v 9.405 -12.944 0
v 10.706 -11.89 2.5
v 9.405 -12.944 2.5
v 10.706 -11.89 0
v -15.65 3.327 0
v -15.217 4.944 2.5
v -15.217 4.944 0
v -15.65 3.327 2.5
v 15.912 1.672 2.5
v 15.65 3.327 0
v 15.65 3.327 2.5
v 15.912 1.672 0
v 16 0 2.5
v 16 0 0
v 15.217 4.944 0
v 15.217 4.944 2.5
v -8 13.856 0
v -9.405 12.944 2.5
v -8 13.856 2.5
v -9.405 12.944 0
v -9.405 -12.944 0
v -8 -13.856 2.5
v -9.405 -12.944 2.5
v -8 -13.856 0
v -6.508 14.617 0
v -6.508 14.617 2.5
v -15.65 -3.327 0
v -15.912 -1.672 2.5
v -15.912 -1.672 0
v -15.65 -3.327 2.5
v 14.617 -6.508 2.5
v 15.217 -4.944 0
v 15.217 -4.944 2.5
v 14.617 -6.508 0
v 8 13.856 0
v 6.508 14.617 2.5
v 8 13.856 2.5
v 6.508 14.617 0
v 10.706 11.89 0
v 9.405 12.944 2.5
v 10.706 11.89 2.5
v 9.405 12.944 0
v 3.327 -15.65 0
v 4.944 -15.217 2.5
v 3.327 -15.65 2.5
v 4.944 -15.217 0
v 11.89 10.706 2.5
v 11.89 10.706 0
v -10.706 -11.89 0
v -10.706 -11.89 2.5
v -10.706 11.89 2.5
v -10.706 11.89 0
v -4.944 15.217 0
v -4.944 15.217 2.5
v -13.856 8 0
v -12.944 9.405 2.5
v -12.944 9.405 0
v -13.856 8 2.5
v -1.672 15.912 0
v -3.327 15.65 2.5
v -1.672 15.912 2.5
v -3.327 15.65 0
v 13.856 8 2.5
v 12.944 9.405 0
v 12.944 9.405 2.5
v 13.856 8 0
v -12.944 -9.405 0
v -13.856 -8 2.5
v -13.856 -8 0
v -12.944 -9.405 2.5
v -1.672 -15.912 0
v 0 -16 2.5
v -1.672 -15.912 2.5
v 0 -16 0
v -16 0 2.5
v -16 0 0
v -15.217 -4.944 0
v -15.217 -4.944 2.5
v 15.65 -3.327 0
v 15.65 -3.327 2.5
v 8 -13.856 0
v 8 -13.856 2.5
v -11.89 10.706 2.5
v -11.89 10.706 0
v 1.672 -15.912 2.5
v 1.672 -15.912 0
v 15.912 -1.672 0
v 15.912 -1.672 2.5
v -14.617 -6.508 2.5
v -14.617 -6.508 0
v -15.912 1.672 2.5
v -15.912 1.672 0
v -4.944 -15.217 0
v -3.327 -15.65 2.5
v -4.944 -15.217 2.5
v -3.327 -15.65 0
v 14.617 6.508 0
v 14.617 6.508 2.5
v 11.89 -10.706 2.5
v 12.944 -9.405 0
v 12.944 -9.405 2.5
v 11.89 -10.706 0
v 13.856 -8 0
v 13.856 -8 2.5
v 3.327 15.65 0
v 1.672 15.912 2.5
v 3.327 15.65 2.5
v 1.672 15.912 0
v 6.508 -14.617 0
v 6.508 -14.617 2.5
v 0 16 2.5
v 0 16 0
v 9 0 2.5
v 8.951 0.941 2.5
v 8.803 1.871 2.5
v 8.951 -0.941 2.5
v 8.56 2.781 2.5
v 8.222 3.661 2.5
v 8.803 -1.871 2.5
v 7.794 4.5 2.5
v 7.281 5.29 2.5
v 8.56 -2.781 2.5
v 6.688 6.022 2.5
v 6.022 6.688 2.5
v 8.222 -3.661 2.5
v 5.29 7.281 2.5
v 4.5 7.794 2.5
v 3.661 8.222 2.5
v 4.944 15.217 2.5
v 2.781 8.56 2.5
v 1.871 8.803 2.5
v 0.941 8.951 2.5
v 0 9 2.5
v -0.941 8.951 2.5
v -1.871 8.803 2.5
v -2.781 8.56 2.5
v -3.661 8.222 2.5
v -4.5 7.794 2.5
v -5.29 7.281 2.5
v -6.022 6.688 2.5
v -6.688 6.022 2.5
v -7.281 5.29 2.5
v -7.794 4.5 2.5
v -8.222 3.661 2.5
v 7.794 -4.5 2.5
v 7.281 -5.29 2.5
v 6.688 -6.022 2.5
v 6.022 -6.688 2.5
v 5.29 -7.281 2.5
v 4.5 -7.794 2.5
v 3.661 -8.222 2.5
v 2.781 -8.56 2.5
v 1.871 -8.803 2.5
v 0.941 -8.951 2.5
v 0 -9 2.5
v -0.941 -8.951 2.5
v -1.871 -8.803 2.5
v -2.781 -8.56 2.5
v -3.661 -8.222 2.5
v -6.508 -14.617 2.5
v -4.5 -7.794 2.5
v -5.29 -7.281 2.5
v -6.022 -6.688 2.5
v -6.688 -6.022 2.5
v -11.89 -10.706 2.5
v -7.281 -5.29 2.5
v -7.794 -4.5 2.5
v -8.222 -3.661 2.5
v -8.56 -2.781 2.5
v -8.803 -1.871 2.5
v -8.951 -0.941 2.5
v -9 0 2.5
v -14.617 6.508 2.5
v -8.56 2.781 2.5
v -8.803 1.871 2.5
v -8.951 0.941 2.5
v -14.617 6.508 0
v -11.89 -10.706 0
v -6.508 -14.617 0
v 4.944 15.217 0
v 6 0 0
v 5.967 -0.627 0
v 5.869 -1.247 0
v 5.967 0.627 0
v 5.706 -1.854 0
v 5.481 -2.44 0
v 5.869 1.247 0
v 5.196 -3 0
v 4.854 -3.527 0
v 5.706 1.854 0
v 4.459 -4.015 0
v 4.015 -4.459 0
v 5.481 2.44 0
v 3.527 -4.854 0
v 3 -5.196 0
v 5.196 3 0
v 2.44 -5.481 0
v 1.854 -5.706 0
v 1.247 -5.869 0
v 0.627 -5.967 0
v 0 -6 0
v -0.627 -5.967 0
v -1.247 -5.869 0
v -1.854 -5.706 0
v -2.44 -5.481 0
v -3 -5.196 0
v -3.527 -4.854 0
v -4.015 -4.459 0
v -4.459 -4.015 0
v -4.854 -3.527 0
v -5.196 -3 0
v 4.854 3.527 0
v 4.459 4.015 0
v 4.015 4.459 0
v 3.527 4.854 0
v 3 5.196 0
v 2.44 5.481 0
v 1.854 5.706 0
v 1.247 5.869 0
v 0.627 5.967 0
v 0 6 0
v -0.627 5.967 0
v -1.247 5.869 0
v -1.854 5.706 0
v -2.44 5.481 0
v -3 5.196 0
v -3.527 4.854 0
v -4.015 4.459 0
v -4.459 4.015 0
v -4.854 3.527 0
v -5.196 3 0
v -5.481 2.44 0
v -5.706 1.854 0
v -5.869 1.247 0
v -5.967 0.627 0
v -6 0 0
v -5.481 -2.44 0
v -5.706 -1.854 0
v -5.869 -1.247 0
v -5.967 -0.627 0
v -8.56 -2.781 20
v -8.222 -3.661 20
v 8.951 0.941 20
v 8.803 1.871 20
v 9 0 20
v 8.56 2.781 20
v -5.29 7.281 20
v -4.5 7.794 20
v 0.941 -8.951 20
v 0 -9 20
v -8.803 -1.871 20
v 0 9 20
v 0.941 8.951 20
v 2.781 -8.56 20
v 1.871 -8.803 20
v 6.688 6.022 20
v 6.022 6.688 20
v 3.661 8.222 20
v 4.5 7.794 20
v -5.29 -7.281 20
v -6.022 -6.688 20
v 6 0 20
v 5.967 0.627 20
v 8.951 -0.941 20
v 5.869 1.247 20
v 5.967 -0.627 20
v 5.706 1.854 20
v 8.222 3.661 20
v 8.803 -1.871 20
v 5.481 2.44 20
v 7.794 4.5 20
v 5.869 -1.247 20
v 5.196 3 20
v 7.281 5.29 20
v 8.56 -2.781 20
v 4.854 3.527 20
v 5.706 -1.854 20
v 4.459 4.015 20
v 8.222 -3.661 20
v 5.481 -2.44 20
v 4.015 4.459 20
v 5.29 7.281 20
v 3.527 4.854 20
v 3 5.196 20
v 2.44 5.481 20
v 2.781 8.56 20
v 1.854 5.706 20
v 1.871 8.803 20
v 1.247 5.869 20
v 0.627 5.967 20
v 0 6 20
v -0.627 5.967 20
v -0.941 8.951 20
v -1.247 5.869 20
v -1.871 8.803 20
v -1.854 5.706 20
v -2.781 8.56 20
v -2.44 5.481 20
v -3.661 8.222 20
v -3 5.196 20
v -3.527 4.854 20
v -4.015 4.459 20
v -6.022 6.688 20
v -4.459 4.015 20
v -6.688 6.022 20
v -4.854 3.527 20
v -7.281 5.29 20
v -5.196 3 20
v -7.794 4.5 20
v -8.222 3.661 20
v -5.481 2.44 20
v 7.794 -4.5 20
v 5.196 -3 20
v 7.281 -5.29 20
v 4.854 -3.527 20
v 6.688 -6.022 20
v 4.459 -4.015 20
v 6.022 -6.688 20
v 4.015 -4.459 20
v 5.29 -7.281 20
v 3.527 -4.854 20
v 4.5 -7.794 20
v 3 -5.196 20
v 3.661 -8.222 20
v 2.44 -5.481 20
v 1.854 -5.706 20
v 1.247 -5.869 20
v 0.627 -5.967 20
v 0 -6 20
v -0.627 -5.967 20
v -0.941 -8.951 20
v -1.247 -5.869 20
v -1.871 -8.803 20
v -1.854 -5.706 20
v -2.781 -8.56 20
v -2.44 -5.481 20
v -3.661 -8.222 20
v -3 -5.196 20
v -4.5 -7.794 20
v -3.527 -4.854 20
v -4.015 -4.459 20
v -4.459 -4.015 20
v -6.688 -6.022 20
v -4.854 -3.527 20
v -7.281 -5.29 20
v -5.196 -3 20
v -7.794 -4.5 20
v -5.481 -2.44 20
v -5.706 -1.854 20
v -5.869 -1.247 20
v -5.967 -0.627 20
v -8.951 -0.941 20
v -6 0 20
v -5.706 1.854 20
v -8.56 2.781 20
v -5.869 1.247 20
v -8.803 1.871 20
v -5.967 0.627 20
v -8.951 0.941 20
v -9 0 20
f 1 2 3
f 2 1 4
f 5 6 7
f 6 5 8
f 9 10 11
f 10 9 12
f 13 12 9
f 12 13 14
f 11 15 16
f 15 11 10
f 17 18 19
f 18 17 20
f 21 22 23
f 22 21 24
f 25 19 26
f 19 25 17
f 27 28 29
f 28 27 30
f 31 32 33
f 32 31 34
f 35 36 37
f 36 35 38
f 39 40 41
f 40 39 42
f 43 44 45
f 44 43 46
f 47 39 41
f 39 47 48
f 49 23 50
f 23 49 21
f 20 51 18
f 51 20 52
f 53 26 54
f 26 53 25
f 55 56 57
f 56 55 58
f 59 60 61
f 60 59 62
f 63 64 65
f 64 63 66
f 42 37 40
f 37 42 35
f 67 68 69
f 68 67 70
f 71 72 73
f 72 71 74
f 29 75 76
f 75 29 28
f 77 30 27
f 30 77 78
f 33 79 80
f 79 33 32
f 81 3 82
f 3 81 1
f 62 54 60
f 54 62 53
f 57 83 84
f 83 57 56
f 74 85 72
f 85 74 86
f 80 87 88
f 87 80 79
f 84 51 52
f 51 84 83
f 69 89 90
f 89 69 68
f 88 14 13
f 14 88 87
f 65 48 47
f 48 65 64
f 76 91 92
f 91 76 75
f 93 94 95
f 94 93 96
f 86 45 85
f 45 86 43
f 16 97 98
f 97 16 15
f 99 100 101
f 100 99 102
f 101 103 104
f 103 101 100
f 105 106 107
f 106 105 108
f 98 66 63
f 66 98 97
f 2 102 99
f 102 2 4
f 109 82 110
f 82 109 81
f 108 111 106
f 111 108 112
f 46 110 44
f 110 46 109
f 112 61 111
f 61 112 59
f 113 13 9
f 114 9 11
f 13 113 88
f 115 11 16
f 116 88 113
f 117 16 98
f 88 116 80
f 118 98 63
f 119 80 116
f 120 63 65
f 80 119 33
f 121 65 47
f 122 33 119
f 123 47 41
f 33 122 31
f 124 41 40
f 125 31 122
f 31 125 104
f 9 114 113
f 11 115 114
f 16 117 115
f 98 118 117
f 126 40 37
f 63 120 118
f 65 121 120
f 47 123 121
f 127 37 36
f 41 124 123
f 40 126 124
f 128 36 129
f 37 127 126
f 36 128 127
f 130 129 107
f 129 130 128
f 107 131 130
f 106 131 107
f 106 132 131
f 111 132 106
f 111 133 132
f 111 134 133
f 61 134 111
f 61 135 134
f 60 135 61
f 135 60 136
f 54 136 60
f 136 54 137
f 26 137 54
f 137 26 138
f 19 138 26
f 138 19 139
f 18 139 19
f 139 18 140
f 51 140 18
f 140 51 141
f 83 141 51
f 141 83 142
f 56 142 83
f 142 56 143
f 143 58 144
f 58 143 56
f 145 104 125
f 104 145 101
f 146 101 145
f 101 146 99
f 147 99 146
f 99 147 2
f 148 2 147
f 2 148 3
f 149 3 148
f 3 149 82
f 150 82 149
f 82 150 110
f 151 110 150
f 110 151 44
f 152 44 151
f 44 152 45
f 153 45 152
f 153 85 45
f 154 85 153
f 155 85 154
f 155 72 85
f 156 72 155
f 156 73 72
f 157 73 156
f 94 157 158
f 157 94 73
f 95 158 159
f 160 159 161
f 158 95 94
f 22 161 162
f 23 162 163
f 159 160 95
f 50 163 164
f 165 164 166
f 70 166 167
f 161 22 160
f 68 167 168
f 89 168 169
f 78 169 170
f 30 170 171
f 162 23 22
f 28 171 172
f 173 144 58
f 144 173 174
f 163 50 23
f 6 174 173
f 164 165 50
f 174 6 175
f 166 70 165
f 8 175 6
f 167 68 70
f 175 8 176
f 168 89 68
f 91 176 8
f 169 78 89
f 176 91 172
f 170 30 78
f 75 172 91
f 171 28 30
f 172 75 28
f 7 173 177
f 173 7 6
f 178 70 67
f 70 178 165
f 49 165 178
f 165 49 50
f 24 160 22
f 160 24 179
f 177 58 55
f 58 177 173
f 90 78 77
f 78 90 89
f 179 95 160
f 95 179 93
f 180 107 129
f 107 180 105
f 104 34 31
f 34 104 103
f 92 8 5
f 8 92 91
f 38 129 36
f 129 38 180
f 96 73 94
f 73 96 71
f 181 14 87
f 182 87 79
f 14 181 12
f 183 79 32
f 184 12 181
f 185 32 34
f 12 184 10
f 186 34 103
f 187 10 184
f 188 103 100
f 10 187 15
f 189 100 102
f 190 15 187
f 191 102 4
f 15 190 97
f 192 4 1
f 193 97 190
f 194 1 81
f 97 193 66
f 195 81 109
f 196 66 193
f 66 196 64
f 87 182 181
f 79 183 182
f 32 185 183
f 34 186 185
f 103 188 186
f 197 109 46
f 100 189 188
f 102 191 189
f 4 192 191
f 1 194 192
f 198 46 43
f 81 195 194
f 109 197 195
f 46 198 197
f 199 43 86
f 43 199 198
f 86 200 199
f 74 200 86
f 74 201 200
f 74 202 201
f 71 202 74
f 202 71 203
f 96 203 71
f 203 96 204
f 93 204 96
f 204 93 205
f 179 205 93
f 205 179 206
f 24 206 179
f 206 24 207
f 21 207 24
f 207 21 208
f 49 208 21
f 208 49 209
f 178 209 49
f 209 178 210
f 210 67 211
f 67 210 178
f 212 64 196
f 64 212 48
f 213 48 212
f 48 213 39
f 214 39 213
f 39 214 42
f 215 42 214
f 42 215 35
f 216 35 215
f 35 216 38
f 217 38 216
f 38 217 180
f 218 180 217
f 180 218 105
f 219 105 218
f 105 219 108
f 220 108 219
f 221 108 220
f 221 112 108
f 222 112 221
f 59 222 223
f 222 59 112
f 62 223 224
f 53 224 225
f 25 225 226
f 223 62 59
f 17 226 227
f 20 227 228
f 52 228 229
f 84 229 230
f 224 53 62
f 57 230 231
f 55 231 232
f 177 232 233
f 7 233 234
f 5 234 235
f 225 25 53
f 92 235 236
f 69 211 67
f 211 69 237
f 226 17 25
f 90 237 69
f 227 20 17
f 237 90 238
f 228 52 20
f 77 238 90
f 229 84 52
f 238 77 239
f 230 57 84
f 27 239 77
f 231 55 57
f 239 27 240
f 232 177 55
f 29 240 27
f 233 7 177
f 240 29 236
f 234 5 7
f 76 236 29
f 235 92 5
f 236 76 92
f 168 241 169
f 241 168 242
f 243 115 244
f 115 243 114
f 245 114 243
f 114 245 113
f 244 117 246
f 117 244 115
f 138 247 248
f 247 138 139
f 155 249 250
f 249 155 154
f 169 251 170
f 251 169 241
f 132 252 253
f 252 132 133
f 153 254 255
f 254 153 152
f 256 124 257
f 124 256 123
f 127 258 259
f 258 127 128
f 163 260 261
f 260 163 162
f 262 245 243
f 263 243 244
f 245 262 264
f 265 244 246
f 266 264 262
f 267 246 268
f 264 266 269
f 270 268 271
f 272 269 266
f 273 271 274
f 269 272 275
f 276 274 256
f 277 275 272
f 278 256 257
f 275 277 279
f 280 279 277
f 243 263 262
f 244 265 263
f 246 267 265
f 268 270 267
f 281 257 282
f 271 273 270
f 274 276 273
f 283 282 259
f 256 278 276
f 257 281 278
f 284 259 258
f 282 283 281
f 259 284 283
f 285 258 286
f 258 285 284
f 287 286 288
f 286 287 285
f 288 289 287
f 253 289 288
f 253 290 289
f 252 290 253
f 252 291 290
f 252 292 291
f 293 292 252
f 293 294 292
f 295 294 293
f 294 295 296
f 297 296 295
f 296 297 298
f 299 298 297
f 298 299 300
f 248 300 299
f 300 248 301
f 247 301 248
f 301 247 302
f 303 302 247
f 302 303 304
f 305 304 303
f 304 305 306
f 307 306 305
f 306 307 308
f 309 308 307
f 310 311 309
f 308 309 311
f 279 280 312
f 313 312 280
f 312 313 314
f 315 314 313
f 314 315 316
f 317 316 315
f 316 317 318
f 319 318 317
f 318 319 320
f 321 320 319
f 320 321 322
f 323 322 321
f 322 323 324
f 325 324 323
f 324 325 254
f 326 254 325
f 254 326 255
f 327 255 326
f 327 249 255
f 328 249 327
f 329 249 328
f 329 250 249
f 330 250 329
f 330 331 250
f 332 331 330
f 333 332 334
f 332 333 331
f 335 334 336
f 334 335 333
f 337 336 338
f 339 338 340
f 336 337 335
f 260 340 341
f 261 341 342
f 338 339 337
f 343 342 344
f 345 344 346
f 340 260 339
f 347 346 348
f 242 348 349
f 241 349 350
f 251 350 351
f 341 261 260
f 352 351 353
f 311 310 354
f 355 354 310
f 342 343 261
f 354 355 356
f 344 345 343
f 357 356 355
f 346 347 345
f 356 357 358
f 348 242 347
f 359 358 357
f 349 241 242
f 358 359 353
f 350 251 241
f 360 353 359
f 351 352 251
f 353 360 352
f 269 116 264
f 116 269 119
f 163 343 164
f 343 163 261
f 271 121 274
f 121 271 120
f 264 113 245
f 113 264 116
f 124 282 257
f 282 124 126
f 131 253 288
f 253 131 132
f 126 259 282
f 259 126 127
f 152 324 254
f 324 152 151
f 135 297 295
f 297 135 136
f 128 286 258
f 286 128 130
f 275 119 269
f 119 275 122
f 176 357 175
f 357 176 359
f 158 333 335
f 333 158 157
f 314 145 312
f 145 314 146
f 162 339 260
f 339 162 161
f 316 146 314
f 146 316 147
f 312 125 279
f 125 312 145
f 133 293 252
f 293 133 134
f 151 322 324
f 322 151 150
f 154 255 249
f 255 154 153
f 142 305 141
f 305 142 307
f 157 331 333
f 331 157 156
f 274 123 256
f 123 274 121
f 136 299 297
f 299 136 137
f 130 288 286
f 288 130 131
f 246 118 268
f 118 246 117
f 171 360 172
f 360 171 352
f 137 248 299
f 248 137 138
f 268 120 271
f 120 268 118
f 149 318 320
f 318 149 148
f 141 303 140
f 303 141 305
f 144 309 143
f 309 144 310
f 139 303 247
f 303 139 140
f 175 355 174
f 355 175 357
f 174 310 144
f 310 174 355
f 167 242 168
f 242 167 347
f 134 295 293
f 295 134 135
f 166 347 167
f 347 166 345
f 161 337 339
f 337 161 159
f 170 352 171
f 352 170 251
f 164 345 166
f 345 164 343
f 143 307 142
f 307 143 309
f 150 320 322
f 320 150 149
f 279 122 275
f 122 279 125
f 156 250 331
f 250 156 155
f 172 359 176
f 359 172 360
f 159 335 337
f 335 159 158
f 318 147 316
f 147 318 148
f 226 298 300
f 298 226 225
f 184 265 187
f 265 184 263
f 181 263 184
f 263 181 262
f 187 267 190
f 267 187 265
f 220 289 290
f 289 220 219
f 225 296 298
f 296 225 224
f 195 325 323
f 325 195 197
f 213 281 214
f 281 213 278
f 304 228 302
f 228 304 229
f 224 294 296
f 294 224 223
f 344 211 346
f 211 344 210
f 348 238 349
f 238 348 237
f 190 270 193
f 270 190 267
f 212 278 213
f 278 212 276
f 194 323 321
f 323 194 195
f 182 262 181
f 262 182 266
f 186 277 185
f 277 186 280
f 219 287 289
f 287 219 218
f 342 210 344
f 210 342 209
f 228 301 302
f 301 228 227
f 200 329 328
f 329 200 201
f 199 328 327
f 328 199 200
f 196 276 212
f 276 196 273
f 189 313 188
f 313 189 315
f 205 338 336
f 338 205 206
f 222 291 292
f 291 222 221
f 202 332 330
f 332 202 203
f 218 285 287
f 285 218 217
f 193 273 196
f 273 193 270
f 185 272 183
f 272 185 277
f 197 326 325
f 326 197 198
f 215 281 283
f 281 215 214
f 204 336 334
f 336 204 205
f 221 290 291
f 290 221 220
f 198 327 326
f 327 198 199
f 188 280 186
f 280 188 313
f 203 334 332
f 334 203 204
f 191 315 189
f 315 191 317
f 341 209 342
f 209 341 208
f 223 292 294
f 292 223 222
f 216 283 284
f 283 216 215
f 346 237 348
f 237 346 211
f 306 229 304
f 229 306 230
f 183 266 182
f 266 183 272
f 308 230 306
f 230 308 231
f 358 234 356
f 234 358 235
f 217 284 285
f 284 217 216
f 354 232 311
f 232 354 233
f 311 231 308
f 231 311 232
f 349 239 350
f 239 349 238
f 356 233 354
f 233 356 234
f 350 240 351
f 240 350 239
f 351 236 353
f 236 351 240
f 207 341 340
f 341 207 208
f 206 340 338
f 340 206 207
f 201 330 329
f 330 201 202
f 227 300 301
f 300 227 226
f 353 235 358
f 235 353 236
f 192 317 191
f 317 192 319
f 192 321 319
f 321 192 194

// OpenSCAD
// Flanged sleeve bushing.
$fn = 60;
eps = 0.02;
inner_d = 12;
outer_d = 18;
length = 20;
flange_d = 32;
flange_t = 2.5;
difference() {
    union() {
        cylinder(d = flange_d, h = flange_t);
        cylinder(d = outer_d, h = length);
    }
    translate([0, 0, -eps]) cylinder(d = inner_d, h = length + 2 * eps);
}
